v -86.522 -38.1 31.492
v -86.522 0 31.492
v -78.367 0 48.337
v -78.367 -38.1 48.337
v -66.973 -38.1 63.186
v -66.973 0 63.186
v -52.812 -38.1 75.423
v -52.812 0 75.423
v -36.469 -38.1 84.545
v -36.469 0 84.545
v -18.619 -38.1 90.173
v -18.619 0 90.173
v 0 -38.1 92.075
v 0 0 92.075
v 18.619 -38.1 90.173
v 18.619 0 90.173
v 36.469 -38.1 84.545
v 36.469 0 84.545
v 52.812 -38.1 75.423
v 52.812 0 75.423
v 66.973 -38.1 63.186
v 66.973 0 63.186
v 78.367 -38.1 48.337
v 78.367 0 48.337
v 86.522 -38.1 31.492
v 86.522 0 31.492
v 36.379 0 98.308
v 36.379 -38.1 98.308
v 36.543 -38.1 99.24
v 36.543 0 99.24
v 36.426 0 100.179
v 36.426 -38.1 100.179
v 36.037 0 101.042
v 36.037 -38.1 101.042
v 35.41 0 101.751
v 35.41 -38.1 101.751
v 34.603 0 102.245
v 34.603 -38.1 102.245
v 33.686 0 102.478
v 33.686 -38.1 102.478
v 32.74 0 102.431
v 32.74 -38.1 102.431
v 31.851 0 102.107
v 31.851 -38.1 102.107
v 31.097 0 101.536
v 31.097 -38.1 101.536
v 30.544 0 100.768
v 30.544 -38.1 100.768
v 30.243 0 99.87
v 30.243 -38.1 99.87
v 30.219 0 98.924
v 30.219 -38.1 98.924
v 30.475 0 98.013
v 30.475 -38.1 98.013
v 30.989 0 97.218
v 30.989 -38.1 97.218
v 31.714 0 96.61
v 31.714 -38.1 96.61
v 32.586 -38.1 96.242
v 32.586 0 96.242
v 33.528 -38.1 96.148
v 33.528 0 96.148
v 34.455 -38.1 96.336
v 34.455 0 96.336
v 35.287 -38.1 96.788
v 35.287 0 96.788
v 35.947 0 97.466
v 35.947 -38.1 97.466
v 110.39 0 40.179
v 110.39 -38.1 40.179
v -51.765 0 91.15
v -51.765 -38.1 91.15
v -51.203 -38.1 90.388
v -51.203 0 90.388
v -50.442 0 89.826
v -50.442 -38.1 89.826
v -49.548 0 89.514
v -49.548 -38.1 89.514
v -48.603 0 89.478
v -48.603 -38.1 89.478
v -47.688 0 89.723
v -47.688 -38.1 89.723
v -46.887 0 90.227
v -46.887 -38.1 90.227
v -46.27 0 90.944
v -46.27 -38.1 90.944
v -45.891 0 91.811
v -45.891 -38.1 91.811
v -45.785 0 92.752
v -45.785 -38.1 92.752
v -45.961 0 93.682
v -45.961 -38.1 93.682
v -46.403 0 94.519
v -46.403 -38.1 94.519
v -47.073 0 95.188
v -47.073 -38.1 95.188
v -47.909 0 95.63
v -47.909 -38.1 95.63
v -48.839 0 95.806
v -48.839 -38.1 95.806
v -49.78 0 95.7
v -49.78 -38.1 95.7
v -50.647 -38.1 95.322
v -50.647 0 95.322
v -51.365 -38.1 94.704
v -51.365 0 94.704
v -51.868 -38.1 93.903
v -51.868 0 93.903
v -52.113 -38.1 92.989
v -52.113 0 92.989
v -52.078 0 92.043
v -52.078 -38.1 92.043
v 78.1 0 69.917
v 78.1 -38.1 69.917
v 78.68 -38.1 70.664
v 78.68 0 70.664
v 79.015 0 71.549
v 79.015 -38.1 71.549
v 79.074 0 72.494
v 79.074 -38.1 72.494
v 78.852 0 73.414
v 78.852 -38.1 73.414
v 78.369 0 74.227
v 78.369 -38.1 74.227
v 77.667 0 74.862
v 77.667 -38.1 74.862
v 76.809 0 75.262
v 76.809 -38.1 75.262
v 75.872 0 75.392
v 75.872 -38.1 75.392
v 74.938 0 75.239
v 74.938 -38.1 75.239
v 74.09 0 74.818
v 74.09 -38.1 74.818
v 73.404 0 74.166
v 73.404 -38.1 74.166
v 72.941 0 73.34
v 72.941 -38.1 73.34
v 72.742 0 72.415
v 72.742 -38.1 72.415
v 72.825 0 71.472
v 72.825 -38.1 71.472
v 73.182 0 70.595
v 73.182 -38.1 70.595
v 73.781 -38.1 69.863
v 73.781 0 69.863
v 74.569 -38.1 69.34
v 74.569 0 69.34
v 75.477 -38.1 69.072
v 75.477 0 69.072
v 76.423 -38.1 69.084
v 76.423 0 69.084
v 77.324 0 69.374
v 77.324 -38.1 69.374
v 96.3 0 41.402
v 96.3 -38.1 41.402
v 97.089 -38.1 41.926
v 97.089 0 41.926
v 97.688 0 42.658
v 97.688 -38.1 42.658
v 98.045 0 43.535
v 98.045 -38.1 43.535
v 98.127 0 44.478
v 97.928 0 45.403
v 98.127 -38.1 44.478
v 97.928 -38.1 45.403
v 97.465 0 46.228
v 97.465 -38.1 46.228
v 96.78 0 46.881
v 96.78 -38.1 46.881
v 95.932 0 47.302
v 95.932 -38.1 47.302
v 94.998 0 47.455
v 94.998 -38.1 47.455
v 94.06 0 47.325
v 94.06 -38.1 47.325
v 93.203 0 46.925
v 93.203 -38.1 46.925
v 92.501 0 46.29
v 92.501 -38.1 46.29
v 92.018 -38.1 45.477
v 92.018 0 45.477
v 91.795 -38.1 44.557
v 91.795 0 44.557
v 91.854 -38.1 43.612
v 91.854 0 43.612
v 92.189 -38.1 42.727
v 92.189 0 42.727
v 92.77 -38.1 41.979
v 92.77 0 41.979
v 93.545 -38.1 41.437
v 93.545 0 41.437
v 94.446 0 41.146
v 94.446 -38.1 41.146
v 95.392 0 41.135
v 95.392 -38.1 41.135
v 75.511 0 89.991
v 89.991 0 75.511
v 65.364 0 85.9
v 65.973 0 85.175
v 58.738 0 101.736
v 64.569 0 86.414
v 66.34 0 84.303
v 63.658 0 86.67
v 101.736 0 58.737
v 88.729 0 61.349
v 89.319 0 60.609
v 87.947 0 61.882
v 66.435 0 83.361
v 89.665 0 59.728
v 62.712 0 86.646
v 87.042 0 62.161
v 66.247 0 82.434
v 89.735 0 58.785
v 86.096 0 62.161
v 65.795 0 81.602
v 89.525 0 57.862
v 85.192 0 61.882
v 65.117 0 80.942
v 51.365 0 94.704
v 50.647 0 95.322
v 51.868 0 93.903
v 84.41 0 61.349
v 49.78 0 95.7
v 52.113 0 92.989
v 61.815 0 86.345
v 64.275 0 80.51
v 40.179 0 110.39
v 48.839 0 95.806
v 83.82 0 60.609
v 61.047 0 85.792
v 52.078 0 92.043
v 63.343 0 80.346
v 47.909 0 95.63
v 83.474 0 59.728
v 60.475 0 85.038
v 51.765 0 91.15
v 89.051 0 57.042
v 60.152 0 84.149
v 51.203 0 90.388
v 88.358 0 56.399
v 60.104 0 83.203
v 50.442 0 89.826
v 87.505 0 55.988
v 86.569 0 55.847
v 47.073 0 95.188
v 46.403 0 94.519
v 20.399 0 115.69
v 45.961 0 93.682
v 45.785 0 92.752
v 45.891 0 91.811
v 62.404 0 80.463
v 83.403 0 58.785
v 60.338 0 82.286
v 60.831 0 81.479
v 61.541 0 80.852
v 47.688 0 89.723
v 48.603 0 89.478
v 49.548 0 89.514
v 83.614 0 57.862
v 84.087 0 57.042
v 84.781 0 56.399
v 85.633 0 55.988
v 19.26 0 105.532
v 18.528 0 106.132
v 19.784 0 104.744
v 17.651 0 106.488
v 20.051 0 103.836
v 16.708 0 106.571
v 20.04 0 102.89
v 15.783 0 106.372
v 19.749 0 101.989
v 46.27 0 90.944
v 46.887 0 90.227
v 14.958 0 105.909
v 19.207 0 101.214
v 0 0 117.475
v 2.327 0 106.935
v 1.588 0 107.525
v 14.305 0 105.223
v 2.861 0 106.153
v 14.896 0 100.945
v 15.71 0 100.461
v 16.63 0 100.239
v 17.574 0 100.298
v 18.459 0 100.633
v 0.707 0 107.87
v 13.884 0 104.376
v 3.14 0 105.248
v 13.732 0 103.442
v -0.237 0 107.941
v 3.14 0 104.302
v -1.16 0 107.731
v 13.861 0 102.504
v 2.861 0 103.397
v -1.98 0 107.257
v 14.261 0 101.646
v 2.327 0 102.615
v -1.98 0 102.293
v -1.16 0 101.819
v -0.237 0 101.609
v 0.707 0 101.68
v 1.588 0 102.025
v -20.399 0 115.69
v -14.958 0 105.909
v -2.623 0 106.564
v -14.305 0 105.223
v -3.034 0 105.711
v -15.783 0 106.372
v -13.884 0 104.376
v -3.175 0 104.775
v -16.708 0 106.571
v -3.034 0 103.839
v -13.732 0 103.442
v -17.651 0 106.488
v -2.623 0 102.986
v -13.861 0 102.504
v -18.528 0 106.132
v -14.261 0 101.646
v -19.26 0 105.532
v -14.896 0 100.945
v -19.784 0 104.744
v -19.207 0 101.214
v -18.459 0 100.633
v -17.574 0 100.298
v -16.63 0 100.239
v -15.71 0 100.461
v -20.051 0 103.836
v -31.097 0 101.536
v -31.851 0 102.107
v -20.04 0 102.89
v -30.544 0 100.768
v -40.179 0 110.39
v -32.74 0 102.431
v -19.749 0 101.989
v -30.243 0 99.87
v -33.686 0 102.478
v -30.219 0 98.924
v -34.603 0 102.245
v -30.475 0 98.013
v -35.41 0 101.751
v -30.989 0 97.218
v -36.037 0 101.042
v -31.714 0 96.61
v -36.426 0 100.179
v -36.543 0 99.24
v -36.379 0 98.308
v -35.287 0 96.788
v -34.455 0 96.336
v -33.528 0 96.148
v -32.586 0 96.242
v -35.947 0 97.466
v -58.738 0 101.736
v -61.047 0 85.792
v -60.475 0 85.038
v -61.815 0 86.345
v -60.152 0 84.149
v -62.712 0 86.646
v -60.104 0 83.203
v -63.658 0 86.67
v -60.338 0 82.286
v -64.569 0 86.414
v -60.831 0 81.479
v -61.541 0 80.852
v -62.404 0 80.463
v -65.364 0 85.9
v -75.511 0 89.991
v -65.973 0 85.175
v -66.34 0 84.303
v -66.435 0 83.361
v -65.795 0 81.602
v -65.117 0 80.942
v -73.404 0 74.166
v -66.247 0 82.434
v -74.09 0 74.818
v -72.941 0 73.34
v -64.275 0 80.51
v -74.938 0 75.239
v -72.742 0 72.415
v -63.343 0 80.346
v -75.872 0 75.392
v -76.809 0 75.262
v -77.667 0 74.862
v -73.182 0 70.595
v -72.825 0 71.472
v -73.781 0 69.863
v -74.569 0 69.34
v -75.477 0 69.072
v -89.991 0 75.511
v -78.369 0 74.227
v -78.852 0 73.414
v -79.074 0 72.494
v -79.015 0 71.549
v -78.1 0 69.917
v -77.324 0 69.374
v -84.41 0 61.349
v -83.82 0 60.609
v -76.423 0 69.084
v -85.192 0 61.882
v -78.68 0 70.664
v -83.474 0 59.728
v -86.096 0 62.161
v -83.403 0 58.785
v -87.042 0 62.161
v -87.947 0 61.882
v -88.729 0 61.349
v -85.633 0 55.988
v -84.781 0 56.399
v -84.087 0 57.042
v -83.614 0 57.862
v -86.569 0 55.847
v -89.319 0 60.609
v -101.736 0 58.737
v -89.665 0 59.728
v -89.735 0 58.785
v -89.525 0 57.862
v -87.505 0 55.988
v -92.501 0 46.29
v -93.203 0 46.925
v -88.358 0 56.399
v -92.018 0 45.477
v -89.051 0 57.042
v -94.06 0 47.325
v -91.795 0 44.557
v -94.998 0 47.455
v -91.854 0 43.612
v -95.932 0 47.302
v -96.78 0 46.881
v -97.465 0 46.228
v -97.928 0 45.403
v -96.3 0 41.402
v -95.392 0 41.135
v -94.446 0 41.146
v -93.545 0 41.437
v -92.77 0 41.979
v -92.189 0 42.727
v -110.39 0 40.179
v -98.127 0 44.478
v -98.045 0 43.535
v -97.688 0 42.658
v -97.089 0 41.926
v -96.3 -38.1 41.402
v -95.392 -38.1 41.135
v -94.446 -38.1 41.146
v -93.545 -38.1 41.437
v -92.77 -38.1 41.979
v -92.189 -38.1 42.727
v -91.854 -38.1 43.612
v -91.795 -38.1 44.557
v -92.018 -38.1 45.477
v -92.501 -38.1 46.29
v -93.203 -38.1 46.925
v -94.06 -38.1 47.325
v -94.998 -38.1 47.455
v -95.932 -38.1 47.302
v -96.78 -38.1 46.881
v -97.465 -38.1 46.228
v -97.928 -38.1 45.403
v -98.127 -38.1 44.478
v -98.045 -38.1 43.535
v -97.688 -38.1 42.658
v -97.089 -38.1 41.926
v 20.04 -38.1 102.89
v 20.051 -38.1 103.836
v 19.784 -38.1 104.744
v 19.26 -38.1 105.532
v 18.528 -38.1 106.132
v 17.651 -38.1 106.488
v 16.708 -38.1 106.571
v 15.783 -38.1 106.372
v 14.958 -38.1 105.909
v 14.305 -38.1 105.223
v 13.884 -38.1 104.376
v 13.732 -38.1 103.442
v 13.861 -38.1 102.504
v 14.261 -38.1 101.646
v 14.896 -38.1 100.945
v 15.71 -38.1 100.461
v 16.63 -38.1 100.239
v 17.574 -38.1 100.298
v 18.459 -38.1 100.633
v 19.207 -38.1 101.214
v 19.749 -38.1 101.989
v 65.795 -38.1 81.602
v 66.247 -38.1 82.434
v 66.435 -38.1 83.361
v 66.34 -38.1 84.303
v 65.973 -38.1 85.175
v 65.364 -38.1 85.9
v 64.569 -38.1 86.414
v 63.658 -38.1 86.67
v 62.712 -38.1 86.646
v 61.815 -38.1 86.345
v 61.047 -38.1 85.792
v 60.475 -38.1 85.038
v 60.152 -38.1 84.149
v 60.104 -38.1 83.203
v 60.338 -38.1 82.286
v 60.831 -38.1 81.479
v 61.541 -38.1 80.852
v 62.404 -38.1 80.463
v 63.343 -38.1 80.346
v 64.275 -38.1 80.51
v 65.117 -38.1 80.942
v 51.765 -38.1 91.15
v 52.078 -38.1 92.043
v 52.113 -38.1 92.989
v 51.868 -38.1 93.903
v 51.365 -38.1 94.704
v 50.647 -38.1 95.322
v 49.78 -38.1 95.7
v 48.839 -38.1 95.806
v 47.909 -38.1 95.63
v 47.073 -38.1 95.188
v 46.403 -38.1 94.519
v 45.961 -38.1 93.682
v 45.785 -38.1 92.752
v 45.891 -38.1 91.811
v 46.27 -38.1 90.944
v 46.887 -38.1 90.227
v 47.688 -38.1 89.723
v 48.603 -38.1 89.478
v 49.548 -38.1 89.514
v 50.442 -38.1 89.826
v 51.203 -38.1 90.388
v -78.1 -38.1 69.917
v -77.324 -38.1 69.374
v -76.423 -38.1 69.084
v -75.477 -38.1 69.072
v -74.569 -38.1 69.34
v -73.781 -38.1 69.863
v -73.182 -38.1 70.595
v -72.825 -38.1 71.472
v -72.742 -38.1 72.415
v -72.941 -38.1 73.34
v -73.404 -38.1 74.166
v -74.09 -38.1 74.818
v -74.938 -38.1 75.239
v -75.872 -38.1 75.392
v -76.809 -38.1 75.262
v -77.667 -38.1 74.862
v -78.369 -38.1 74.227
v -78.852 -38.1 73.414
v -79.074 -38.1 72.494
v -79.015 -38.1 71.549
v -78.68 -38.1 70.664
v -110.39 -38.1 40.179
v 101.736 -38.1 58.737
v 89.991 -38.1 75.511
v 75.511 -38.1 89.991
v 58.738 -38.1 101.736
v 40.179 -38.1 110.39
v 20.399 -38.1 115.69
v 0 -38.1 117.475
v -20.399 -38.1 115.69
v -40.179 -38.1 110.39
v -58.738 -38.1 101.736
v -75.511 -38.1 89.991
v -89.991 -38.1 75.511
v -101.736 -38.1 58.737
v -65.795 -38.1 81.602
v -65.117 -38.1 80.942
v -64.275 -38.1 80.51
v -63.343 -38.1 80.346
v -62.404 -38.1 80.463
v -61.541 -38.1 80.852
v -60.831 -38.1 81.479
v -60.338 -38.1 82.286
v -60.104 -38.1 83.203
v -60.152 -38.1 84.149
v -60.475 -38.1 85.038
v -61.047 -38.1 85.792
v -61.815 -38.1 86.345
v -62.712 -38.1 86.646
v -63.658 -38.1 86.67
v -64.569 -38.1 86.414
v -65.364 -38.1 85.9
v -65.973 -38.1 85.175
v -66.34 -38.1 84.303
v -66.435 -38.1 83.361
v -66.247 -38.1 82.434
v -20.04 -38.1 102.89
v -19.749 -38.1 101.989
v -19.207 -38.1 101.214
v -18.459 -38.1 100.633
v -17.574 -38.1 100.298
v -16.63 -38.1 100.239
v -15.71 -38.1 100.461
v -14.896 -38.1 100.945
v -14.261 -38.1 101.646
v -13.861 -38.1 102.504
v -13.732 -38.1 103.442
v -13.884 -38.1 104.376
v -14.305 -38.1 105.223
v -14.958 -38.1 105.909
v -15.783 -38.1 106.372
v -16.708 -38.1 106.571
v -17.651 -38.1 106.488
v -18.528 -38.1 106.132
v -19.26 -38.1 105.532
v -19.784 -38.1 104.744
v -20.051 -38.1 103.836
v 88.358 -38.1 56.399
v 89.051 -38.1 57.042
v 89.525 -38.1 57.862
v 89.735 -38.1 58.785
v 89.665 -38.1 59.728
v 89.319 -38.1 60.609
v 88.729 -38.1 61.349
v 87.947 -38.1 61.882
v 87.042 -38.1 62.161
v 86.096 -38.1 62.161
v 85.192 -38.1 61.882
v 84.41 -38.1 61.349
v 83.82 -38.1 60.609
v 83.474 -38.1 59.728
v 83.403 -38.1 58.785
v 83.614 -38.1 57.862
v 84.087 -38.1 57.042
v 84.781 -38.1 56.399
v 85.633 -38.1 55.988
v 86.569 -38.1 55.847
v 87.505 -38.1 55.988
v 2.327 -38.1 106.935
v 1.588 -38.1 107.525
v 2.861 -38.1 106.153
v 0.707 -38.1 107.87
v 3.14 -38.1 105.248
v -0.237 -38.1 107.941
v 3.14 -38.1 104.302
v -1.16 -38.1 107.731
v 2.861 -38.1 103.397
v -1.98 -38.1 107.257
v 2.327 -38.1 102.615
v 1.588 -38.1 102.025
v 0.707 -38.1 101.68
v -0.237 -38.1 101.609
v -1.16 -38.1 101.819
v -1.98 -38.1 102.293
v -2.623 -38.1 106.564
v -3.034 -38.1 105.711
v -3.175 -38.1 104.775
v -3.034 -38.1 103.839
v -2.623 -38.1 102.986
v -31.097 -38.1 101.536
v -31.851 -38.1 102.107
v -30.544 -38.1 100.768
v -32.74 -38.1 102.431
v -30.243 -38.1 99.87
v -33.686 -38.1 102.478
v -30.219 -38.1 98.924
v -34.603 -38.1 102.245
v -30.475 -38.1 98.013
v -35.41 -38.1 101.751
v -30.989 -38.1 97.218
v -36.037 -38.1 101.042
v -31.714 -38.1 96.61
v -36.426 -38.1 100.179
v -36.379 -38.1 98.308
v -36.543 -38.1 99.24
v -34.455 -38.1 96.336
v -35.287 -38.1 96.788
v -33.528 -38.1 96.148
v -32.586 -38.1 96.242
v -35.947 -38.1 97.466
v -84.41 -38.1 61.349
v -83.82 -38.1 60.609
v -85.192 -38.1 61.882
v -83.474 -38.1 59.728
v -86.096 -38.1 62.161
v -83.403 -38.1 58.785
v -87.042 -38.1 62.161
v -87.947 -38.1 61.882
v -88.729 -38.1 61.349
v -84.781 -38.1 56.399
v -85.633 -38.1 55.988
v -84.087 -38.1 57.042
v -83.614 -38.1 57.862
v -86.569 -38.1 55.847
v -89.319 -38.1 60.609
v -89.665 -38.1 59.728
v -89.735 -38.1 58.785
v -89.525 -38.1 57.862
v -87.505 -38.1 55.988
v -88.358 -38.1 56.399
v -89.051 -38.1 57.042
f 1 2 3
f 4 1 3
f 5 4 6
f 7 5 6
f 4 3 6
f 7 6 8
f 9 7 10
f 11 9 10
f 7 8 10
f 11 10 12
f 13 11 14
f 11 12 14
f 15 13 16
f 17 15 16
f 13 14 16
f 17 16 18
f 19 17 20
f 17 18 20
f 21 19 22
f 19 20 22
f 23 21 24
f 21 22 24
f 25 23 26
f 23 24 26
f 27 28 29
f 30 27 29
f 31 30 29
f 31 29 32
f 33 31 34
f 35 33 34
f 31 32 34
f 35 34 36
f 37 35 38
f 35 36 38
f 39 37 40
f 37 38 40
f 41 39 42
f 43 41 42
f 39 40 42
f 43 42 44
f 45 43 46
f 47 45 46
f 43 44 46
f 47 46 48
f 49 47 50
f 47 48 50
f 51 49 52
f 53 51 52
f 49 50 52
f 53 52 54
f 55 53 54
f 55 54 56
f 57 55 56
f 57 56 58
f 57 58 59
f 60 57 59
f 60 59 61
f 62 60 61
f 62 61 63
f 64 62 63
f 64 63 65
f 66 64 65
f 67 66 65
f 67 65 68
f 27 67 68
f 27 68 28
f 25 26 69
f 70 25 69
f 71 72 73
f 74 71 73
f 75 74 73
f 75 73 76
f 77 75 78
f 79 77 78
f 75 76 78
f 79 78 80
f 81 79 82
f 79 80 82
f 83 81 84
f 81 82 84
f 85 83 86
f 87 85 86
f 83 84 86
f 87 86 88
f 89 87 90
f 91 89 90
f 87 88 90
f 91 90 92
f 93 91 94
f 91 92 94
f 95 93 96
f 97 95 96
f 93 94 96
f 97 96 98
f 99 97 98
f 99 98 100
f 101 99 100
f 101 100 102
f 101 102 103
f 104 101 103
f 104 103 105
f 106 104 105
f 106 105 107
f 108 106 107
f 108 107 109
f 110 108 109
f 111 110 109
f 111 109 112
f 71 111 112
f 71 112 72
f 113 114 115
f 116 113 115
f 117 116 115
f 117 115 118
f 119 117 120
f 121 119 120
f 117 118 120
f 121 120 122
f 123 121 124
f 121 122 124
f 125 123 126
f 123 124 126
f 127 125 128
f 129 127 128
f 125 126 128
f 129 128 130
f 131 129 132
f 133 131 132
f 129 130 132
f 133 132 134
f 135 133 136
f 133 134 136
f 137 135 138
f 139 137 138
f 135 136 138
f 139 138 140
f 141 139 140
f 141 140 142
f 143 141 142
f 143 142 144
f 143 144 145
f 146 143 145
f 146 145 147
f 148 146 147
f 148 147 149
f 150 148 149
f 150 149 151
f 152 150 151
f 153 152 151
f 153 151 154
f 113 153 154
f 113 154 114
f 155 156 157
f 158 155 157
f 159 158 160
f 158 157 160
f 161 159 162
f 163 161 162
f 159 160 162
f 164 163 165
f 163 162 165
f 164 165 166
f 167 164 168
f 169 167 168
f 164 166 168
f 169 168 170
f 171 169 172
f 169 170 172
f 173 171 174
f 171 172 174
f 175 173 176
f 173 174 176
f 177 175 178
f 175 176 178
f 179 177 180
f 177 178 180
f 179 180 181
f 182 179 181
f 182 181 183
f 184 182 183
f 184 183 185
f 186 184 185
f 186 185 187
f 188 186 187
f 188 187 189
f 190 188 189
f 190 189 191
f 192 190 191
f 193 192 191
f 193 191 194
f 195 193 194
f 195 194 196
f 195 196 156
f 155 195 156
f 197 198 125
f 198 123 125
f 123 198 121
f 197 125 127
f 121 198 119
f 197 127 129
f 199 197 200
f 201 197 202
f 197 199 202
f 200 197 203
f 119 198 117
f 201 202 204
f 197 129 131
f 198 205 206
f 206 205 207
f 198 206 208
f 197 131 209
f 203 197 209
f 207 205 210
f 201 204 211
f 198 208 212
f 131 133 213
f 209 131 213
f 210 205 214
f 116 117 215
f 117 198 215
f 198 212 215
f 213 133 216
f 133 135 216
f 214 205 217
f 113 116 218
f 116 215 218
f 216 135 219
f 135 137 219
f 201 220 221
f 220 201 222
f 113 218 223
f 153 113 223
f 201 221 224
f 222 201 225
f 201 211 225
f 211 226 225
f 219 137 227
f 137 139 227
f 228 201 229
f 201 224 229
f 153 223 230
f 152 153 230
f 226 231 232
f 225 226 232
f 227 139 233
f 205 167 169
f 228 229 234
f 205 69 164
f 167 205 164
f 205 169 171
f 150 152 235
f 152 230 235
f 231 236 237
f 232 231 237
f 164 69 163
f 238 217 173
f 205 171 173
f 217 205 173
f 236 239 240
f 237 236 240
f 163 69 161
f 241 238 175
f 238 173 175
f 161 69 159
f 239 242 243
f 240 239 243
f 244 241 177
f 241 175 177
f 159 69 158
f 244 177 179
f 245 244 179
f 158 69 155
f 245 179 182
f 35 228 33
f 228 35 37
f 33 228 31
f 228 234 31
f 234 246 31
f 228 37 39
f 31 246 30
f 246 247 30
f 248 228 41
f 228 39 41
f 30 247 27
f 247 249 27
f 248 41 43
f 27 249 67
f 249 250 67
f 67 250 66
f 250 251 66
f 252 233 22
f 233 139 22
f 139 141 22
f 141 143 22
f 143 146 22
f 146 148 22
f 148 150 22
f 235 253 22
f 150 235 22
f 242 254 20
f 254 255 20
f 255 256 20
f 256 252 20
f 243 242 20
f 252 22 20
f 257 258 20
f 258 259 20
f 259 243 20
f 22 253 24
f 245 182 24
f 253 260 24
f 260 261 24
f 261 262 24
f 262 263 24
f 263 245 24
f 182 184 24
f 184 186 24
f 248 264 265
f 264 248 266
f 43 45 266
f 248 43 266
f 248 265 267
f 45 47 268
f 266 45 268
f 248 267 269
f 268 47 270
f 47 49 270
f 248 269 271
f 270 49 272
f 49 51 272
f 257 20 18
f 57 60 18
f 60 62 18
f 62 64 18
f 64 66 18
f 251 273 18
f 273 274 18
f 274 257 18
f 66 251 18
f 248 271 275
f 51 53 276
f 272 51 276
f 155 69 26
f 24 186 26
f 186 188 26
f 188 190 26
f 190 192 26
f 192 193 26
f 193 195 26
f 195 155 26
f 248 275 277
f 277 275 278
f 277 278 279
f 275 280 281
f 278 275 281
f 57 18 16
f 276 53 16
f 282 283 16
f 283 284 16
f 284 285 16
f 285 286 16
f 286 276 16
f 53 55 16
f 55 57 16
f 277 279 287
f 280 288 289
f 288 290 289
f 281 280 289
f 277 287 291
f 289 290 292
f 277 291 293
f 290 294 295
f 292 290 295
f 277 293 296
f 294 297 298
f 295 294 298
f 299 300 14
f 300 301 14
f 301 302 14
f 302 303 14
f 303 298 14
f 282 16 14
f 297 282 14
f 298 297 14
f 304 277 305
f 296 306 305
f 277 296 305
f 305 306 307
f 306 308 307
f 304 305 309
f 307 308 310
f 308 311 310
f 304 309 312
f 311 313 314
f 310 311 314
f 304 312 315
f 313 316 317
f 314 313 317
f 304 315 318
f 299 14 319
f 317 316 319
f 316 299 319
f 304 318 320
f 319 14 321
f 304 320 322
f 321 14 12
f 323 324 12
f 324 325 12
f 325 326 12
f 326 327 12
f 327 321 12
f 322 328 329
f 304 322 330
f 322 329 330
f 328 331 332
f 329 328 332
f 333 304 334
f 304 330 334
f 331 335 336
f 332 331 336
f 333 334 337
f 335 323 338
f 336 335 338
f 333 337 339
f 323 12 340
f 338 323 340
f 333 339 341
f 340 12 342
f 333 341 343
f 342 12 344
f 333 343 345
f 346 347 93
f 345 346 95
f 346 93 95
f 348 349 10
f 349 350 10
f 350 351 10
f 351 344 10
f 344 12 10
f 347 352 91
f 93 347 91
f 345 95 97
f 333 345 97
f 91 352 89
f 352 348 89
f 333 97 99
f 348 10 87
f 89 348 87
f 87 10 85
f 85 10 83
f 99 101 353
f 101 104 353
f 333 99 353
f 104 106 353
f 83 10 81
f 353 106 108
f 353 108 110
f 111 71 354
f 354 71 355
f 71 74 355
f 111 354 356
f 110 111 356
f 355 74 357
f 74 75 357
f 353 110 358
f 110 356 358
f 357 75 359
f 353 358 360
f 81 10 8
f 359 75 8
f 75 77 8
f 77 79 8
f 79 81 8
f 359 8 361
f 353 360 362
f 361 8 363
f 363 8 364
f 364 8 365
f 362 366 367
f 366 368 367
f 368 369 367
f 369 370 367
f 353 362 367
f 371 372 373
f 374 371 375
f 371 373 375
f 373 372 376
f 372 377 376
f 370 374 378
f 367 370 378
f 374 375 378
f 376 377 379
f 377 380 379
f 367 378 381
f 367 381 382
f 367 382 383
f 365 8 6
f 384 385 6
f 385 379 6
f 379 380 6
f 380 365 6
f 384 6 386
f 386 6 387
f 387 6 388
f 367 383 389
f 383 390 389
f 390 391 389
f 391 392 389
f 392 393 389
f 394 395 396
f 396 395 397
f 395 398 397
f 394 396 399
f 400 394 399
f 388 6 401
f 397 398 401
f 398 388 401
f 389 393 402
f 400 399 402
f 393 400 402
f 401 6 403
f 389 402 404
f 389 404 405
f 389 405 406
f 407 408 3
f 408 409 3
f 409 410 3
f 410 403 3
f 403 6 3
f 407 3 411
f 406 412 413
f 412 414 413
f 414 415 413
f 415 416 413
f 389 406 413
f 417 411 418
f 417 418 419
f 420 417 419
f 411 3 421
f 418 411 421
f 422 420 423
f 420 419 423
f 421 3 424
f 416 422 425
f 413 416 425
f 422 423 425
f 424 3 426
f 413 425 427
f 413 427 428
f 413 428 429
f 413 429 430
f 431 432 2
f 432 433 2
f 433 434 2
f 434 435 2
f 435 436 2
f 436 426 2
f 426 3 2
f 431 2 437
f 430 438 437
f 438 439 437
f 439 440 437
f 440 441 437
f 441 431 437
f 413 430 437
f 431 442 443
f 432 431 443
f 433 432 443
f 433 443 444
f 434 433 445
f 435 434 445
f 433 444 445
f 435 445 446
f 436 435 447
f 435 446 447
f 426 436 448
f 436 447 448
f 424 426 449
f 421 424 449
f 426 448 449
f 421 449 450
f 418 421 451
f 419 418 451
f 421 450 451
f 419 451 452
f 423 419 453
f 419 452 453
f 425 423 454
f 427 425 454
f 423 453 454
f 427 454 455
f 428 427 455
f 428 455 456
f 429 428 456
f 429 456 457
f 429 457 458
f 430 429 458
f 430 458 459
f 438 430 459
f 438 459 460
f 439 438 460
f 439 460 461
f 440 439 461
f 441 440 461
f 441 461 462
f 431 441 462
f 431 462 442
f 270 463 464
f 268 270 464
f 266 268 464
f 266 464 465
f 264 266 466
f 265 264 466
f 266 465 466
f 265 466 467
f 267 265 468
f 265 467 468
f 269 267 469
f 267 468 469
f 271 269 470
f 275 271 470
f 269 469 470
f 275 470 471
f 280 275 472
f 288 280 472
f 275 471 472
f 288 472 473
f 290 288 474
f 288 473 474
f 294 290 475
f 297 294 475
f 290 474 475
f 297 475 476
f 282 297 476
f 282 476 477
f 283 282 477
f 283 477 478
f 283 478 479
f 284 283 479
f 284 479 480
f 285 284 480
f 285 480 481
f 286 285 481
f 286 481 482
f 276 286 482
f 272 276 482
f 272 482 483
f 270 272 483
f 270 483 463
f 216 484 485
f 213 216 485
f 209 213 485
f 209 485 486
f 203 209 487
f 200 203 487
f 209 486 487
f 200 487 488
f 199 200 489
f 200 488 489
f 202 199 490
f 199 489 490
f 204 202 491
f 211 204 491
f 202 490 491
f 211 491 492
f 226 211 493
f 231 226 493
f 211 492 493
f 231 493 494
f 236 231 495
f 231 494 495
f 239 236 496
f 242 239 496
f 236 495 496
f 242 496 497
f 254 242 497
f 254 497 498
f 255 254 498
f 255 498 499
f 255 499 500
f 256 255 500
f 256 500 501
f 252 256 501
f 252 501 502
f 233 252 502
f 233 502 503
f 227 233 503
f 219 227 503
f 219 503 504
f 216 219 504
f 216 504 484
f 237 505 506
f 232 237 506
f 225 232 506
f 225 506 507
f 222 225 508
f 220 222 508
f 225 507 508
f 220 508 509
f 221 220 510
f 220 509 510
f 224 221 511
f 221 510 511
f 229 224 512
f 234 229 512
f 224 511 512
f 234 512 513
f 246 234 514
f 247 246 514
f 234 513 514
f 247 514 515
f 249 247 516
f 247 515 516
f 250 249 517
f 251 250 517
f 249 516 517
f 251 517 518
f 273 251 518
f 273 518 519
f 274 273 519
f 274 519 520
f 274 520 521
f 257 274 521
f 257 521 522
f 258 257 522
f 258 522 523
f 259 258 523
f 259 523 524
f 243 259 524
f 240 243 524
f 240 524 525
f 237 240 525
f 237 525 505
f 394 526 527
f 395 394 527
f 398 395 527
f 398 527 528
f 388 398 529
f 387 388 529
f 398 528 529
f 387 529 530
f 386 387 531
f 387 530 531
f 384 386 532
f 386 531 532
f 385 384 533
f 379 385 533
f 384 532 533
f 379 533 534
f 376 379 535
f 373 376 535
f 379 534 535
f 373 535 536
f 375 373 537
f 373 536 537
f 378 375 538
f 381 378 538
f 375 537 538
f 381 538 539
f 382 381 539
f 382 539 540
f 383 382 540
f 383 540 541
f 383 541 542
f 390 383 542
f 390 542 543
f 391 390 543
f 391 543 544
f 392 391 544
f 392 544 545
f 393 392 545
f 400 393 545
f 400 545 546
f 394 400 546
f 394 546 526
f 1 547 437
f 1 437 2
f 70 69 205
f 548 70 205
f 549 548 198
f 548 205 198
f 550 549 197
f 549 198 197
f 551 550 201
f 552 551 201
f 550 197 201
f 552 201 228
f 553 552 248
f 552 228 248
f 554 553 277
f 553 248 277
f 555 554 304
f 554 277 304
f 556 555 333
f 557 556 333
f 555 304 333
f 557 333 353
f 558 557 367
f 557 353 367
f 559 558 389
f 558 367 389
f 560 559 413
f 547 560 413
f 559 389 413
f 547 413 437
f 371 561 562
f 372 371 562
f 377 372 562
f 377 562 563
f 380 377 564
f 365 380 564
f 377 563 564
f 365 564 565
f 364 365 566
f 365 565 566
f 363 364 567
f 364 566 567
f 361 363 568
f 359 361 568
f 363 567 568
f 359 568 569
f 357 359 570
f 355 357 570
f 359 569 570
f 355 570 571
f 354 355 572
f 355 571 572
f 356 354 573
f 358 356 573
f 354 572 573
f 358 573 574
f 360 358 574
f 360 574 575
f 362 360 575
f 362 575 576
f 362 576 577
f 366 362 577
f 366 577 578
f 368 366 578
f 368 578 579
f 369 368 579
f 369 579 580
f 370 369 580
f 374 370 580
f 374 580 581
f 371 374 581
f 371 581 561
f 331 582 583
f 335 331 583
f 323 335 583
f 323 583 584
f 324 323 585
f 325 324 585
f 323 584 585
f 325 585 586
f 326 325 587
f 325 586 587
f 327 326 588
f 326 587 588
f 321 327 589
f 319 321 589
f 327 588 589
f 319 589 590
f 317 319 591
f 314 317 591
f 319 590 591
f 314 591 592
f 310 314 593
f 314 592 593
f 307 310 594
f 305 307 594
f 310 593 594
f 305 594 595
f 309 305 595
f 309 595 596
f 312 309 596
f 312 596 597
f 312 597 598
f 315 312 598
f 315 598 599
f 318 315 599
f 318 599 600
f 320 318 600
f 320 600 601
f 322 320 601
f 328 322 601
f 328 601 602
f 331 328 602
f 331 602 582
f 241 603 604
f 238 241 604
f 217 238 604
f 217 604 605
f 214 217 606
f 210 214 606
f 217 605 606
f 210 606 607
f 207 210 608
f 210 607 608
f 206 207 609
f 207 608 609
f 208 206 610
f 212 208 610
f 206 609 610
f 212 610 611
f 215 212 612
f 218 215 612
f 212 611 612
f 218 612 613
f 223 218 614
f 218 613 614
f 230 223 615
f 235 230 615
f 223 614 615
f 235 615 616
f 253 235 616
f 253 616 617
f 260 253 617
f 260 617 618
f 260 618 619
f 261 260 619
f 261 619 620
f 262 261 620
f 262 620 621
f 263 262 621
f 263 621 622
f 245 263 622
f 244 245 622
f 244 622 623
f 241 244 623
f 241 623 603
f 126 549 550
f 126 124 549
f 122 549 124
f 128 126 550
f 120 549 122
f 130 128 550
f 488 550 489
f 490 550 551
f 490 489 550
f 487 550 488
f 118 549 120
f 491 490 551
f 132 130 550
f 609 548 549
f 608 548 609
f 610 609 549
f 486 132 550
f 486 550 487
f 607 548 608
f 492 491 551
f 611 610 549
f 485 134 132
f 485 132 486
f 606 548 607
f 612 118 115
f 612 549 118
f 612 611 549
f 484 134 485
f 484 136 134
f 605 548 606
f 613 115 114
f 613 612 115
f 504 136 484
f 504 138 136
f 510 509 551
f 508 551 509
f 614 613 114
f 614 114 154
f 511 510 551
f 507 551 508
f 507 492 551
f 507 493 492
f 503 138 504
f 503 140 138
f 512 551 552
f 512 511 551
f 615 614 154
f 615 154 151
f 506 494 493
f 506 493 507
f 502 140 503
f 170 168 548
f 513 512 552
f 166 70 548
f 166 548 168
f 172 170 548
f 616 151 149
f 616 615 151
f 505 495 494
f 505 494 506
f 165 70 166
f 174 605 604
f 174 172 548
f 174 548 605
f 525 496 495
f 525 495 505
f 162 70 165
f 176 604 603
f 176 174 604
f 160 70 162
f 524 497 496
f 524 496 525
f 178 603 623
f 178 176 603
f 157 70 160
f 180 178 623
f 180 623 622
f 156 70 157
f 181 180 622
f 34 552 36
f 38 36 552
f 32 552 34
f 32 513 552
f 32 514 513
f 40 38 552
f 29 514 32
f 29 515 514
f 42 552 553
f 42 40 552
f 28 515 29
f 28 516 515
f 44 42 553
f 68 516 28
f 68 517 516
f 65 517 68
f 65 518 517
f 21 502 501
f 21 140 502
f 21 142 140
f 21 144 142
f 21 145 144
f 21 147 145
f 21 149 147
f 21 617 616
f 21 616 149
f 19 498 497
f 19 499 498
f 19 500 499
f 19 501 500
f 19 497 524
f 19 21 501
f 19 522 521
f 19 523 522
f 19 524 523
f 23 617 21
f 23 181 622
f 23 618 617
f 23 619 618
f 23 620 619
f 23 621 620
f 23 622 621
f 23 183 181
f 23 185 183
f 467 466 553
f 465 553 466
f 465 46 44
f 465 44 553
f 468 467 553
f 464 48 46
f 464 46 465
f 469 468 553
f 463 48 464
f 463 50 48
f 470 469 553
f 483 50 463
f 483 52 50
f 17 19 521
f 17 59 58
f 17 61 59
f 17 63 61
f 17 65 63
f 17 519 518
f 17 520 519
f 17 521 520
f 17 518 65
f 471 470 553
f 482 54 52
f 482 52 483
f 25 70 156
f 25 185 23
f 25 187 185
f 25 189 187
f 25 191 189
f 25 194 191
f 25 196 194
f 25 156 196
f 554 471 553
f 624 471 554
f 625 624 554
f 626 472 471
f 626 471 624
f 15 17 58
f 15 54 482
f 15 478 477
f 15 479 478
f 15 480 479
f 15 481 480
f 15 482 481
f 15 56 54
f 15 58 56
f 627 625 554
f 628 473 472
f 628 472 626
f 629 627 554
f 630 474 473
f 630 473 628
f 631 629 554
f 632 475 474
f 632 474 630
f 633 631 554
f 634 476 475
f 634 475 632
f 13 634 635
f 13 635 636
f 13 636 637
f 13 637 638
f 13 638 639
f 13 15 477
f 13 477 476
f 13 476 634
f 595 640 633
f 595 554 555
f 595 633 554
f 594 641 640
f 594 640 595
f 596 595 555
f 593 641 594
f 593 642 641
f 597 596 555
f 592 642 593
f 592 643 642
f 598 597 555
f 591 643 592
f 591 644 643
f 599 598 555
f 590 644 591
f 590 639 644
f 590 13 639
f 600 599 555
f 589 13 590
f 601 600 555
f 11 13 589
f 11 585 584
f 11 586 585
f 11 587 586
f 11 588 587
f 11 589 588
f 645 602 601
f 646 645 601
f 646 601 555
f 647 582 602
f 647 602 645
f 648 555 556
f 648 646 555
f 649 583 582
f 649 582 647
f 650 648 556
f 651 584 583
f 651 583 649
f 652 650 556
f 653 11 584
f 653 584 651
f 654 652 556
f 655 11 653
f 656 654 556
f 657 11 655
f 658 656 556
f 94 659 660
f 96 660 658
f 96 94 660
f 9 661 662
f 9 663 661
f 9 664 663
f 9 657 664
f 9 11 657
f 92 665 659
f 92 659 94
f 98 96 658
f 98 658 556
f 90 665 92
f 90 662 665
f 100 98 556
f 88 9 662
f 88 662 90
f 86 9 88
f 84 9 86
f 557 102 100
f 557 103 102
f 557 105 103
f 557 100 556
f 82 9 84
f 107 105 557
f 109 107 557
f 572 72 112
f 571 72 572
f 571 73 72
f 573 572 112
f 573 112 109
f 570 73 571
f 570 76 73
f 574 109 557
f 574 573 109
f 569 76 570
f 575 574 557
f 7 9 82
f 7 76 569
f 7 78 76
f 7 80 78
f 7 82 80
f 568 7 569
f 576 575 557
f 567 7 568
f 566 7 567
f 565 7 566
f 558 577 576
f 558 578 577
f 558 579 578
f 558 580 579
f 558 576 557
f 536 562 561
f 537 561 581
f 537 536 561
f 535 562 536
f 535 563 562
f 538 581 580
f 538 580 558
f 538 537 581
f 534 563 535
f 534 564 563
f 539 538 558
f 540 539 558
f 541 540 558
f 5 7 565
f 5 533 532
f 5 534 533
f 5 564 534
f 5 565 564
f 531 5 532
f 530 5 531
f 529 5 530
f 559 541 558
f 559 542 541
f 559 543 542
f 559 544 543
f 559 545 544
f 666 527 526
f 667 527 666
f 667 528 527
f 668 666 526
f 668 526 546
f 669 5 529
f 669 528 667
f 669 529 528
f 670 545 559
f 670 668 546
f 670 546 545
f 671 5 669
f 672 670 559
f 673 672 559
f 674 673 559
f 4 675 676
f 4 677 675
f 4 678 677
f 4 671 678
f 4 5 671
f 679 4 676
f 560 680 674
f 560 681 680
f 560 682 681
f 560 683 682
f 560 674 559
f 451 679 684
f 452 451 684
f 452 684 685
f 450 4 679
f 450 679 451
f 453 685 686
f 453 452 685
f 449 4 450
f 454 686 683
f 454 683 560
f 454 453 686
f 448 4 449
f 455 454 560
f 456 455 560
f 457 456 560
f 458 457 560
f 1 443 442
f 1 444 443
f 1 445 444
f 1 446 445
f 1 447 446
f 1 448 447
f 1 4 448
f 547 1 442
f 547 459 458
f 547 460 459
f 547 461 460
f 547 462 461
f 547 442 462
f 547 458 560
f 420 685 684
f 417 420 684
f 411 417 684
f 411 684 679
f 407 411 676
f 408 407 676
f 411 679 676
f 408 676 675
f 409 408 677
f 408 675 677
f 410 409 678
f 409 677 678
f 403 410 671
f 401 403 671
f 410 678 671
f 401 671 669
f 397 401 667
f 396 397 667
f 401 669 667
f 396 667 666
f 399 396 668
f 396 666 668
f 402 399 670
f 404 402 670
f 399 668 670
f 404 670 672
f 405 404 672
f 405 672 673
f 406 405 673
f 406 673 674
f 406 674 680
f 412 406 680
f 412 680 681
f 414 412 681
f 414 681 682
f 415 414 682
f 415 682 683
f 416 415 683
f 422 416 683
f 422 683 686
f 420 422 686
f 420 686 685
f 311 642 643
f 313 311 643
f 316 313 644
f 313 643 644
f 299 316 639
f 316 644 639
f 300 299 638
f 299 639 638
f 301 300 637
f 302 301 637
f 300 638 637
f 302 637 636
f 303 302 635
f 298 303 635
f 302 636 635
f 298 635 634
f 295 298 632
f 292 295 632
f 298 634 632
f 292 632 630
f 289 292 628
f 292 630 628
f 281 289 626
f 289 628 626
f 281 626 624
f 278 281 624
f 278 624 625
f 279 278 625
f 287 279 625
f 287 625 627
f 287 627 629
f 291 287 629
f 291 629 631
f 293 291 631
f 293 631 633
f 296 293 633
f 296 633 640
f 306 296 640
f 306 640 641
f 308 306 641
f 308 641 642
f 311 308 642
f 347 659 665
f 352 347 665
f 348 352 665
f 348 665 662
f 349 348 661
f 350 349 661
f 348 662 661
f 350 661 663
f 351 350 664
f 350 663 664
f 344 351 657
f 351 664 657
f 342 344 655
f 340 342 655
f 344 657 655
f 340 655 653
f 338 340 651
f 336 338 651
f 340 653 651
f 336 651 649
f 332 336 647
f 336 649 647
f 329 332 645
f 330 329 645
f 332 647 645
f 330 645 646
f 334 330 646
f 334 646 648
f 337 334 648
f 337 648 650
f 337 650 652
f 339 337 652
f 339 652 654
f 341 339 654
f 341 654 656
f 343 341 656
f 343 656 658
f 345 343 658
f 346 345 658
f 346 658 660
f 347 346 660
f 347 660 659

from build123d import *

# Parameters (mm, degrees)
BOSS_EXTRUDE1_DEPTH        = 38.1
F_1_4_0_2500_DOWEL_HOLE1_D = 6.35
CIRPATTERN1_COUNT          = 8
CIRPATTERN1_ANGLE          = 65
MIRROR1_COPY_1_D           = 6.35
MIRROR1_COPY_2_D           = 6.35
MIRROR1_COPY_3_D           = 6.35
MIRROR1_COPY_4_D           = 6.35
MIRROR1_COPY_5_D           = 6.35
MIRROR1_COPY_6_D           = 6.35
MIRROR1_COPY_7_D           = 6.35
MIRROR1_COPY_8_D           = 6.35


with BuildPart() as part:
    # Sketch1 → Boss-Extrude1 (new body)
    with BuildSketch(Plane(origin=(0, 0, 0), x_dir=(1, 0, 0), z_dir=(0, 1, 0))):
        with BuildLine():
            Line((-110.390390627, -40.178816337), (-86.522198059, -31.491504697))
            ThreePointArc((-86.522198059, -31.491504697), (0, -92.075), (86.522198059, -31.491504697))
            Line((86.522198059, -31.491504697), (110.390390627, -40.178816337))
            ThreePointArc((110.390390627, -40.178816337), (0, -117.475), (-110.390390627, -40.178816337))
        make_face()
    extrude(amount=-BOSS_EXTRUDE1_DEPTH)

    # 1/4 (0.2500) Dowel Hole1 (through all)
    with Locations(Plane(origin=(0, 0, 0), x_dir=(1, 0, 0), z_dir=(0, 1, 0))):
        with Locations((0, -104.775)):
            f_1_4_0_2500_dowel_hole1 = Hole(F_1_4_0_2500_DOWEL_HOLE1_D / 2)

    # CirPattern1: 1/4 (0.2500) Dowel Hole1 ×8 about axis
    cirpattern1_axis = Axis((0, 0, 0), (0, -1, 0))
    for i in range(1, CIRPATTERN1_COUNT):
        add(f_1_4_0_2500_dowel_hole1.rotate(cirpattern1_axis, i * CIRPATTERN1_ANGLE / (CIRPATTERN1_COUNT - 1)), mode=Mode.SUBTRACT)

    # Mirror1 copy 1 (through all)
    with Locations(Plane(origin=(0, 0, 0), x_dir=(-0.9868959788567211, 0, 0.161357760632807), z_dir=(0, 1, 0))):
        with Locations((0, 104.775)):
            Hole(MIRROR1_COPY_1_D / 2)

    # Mirror1 copy 2 (through all)
    with Locations(Plane(origin=(0, 0, 0), x_dir=(-0.9479273461671315, 0, 0.3184866502516851), z_dir=(0, 1, 0))):
        with Locations((0, 104.775)):
            Hole(MIRROR1_COPY_2_D / 2)

    # Mirror1 copy 3 (through all)
    with Locations(Plane(origin=(0, 0, 0), x_dir=(-0.8841153935046093, 0, 0.4672686282730629), z_dir=(0, 1, 0))):
        with Locations((0, 104.775)):
            Hole(MIRROR1_COPY_3_D / 2)

    # Mirror1 copy 4 (through all)
    with Locations(Plane(origin=(0, 0, 0), x_dir=(-0.7971325072229216, 0, 0.6038044103254785), z_dir=(0, 1, 0))):
        with Locations((0, 104.775)):
            Hole(MIRROR1_COPY_4_D / 2)

    # Mirror1 copy 5 (through all)
    with Locations(Plane(origin=(0, 0, 0), x_dir=(-0.6892583384839459, 0, 0.7245156608592739), z_dir=(0, 1, 0))):
        with Locations((0, 104.775)):
            Hole(MIRROR1_COPY_5_D / 2)

    # Mirror1 copy 6 (through all)
    with Locations(Plane(origin=(0, 0, 0), x_dir=(-0.5633200580636203, 0, 0.8262387743159961), z_dir=(0, 1, 0))):
        with Locations((0, 104.775)):
            Hole(MIRROR1_COPY_6_D / 2)

    # Mirror1 copy 7 (through all)
    with Locations(Plane(origin=(0, 0, 0), x_dir=(-0.4226182617406972, 0, 0.906307787036651), z_dir=(0, 1, 0))):
        with Locations((0, 104.775)):
            Hole(MIRROR1_COPY_7_D / 2)

    # Mirror1 copy 8 (through all)
    with Locations(Plane(origin=(0, 0, 0), x_dir=(-1, 0, 0), z_dir=(0, 1, 0))):
        with Locations((0, 104.775)):
            Hole(MIRROR1_COPY_8_D / 2)


solid = part.part
